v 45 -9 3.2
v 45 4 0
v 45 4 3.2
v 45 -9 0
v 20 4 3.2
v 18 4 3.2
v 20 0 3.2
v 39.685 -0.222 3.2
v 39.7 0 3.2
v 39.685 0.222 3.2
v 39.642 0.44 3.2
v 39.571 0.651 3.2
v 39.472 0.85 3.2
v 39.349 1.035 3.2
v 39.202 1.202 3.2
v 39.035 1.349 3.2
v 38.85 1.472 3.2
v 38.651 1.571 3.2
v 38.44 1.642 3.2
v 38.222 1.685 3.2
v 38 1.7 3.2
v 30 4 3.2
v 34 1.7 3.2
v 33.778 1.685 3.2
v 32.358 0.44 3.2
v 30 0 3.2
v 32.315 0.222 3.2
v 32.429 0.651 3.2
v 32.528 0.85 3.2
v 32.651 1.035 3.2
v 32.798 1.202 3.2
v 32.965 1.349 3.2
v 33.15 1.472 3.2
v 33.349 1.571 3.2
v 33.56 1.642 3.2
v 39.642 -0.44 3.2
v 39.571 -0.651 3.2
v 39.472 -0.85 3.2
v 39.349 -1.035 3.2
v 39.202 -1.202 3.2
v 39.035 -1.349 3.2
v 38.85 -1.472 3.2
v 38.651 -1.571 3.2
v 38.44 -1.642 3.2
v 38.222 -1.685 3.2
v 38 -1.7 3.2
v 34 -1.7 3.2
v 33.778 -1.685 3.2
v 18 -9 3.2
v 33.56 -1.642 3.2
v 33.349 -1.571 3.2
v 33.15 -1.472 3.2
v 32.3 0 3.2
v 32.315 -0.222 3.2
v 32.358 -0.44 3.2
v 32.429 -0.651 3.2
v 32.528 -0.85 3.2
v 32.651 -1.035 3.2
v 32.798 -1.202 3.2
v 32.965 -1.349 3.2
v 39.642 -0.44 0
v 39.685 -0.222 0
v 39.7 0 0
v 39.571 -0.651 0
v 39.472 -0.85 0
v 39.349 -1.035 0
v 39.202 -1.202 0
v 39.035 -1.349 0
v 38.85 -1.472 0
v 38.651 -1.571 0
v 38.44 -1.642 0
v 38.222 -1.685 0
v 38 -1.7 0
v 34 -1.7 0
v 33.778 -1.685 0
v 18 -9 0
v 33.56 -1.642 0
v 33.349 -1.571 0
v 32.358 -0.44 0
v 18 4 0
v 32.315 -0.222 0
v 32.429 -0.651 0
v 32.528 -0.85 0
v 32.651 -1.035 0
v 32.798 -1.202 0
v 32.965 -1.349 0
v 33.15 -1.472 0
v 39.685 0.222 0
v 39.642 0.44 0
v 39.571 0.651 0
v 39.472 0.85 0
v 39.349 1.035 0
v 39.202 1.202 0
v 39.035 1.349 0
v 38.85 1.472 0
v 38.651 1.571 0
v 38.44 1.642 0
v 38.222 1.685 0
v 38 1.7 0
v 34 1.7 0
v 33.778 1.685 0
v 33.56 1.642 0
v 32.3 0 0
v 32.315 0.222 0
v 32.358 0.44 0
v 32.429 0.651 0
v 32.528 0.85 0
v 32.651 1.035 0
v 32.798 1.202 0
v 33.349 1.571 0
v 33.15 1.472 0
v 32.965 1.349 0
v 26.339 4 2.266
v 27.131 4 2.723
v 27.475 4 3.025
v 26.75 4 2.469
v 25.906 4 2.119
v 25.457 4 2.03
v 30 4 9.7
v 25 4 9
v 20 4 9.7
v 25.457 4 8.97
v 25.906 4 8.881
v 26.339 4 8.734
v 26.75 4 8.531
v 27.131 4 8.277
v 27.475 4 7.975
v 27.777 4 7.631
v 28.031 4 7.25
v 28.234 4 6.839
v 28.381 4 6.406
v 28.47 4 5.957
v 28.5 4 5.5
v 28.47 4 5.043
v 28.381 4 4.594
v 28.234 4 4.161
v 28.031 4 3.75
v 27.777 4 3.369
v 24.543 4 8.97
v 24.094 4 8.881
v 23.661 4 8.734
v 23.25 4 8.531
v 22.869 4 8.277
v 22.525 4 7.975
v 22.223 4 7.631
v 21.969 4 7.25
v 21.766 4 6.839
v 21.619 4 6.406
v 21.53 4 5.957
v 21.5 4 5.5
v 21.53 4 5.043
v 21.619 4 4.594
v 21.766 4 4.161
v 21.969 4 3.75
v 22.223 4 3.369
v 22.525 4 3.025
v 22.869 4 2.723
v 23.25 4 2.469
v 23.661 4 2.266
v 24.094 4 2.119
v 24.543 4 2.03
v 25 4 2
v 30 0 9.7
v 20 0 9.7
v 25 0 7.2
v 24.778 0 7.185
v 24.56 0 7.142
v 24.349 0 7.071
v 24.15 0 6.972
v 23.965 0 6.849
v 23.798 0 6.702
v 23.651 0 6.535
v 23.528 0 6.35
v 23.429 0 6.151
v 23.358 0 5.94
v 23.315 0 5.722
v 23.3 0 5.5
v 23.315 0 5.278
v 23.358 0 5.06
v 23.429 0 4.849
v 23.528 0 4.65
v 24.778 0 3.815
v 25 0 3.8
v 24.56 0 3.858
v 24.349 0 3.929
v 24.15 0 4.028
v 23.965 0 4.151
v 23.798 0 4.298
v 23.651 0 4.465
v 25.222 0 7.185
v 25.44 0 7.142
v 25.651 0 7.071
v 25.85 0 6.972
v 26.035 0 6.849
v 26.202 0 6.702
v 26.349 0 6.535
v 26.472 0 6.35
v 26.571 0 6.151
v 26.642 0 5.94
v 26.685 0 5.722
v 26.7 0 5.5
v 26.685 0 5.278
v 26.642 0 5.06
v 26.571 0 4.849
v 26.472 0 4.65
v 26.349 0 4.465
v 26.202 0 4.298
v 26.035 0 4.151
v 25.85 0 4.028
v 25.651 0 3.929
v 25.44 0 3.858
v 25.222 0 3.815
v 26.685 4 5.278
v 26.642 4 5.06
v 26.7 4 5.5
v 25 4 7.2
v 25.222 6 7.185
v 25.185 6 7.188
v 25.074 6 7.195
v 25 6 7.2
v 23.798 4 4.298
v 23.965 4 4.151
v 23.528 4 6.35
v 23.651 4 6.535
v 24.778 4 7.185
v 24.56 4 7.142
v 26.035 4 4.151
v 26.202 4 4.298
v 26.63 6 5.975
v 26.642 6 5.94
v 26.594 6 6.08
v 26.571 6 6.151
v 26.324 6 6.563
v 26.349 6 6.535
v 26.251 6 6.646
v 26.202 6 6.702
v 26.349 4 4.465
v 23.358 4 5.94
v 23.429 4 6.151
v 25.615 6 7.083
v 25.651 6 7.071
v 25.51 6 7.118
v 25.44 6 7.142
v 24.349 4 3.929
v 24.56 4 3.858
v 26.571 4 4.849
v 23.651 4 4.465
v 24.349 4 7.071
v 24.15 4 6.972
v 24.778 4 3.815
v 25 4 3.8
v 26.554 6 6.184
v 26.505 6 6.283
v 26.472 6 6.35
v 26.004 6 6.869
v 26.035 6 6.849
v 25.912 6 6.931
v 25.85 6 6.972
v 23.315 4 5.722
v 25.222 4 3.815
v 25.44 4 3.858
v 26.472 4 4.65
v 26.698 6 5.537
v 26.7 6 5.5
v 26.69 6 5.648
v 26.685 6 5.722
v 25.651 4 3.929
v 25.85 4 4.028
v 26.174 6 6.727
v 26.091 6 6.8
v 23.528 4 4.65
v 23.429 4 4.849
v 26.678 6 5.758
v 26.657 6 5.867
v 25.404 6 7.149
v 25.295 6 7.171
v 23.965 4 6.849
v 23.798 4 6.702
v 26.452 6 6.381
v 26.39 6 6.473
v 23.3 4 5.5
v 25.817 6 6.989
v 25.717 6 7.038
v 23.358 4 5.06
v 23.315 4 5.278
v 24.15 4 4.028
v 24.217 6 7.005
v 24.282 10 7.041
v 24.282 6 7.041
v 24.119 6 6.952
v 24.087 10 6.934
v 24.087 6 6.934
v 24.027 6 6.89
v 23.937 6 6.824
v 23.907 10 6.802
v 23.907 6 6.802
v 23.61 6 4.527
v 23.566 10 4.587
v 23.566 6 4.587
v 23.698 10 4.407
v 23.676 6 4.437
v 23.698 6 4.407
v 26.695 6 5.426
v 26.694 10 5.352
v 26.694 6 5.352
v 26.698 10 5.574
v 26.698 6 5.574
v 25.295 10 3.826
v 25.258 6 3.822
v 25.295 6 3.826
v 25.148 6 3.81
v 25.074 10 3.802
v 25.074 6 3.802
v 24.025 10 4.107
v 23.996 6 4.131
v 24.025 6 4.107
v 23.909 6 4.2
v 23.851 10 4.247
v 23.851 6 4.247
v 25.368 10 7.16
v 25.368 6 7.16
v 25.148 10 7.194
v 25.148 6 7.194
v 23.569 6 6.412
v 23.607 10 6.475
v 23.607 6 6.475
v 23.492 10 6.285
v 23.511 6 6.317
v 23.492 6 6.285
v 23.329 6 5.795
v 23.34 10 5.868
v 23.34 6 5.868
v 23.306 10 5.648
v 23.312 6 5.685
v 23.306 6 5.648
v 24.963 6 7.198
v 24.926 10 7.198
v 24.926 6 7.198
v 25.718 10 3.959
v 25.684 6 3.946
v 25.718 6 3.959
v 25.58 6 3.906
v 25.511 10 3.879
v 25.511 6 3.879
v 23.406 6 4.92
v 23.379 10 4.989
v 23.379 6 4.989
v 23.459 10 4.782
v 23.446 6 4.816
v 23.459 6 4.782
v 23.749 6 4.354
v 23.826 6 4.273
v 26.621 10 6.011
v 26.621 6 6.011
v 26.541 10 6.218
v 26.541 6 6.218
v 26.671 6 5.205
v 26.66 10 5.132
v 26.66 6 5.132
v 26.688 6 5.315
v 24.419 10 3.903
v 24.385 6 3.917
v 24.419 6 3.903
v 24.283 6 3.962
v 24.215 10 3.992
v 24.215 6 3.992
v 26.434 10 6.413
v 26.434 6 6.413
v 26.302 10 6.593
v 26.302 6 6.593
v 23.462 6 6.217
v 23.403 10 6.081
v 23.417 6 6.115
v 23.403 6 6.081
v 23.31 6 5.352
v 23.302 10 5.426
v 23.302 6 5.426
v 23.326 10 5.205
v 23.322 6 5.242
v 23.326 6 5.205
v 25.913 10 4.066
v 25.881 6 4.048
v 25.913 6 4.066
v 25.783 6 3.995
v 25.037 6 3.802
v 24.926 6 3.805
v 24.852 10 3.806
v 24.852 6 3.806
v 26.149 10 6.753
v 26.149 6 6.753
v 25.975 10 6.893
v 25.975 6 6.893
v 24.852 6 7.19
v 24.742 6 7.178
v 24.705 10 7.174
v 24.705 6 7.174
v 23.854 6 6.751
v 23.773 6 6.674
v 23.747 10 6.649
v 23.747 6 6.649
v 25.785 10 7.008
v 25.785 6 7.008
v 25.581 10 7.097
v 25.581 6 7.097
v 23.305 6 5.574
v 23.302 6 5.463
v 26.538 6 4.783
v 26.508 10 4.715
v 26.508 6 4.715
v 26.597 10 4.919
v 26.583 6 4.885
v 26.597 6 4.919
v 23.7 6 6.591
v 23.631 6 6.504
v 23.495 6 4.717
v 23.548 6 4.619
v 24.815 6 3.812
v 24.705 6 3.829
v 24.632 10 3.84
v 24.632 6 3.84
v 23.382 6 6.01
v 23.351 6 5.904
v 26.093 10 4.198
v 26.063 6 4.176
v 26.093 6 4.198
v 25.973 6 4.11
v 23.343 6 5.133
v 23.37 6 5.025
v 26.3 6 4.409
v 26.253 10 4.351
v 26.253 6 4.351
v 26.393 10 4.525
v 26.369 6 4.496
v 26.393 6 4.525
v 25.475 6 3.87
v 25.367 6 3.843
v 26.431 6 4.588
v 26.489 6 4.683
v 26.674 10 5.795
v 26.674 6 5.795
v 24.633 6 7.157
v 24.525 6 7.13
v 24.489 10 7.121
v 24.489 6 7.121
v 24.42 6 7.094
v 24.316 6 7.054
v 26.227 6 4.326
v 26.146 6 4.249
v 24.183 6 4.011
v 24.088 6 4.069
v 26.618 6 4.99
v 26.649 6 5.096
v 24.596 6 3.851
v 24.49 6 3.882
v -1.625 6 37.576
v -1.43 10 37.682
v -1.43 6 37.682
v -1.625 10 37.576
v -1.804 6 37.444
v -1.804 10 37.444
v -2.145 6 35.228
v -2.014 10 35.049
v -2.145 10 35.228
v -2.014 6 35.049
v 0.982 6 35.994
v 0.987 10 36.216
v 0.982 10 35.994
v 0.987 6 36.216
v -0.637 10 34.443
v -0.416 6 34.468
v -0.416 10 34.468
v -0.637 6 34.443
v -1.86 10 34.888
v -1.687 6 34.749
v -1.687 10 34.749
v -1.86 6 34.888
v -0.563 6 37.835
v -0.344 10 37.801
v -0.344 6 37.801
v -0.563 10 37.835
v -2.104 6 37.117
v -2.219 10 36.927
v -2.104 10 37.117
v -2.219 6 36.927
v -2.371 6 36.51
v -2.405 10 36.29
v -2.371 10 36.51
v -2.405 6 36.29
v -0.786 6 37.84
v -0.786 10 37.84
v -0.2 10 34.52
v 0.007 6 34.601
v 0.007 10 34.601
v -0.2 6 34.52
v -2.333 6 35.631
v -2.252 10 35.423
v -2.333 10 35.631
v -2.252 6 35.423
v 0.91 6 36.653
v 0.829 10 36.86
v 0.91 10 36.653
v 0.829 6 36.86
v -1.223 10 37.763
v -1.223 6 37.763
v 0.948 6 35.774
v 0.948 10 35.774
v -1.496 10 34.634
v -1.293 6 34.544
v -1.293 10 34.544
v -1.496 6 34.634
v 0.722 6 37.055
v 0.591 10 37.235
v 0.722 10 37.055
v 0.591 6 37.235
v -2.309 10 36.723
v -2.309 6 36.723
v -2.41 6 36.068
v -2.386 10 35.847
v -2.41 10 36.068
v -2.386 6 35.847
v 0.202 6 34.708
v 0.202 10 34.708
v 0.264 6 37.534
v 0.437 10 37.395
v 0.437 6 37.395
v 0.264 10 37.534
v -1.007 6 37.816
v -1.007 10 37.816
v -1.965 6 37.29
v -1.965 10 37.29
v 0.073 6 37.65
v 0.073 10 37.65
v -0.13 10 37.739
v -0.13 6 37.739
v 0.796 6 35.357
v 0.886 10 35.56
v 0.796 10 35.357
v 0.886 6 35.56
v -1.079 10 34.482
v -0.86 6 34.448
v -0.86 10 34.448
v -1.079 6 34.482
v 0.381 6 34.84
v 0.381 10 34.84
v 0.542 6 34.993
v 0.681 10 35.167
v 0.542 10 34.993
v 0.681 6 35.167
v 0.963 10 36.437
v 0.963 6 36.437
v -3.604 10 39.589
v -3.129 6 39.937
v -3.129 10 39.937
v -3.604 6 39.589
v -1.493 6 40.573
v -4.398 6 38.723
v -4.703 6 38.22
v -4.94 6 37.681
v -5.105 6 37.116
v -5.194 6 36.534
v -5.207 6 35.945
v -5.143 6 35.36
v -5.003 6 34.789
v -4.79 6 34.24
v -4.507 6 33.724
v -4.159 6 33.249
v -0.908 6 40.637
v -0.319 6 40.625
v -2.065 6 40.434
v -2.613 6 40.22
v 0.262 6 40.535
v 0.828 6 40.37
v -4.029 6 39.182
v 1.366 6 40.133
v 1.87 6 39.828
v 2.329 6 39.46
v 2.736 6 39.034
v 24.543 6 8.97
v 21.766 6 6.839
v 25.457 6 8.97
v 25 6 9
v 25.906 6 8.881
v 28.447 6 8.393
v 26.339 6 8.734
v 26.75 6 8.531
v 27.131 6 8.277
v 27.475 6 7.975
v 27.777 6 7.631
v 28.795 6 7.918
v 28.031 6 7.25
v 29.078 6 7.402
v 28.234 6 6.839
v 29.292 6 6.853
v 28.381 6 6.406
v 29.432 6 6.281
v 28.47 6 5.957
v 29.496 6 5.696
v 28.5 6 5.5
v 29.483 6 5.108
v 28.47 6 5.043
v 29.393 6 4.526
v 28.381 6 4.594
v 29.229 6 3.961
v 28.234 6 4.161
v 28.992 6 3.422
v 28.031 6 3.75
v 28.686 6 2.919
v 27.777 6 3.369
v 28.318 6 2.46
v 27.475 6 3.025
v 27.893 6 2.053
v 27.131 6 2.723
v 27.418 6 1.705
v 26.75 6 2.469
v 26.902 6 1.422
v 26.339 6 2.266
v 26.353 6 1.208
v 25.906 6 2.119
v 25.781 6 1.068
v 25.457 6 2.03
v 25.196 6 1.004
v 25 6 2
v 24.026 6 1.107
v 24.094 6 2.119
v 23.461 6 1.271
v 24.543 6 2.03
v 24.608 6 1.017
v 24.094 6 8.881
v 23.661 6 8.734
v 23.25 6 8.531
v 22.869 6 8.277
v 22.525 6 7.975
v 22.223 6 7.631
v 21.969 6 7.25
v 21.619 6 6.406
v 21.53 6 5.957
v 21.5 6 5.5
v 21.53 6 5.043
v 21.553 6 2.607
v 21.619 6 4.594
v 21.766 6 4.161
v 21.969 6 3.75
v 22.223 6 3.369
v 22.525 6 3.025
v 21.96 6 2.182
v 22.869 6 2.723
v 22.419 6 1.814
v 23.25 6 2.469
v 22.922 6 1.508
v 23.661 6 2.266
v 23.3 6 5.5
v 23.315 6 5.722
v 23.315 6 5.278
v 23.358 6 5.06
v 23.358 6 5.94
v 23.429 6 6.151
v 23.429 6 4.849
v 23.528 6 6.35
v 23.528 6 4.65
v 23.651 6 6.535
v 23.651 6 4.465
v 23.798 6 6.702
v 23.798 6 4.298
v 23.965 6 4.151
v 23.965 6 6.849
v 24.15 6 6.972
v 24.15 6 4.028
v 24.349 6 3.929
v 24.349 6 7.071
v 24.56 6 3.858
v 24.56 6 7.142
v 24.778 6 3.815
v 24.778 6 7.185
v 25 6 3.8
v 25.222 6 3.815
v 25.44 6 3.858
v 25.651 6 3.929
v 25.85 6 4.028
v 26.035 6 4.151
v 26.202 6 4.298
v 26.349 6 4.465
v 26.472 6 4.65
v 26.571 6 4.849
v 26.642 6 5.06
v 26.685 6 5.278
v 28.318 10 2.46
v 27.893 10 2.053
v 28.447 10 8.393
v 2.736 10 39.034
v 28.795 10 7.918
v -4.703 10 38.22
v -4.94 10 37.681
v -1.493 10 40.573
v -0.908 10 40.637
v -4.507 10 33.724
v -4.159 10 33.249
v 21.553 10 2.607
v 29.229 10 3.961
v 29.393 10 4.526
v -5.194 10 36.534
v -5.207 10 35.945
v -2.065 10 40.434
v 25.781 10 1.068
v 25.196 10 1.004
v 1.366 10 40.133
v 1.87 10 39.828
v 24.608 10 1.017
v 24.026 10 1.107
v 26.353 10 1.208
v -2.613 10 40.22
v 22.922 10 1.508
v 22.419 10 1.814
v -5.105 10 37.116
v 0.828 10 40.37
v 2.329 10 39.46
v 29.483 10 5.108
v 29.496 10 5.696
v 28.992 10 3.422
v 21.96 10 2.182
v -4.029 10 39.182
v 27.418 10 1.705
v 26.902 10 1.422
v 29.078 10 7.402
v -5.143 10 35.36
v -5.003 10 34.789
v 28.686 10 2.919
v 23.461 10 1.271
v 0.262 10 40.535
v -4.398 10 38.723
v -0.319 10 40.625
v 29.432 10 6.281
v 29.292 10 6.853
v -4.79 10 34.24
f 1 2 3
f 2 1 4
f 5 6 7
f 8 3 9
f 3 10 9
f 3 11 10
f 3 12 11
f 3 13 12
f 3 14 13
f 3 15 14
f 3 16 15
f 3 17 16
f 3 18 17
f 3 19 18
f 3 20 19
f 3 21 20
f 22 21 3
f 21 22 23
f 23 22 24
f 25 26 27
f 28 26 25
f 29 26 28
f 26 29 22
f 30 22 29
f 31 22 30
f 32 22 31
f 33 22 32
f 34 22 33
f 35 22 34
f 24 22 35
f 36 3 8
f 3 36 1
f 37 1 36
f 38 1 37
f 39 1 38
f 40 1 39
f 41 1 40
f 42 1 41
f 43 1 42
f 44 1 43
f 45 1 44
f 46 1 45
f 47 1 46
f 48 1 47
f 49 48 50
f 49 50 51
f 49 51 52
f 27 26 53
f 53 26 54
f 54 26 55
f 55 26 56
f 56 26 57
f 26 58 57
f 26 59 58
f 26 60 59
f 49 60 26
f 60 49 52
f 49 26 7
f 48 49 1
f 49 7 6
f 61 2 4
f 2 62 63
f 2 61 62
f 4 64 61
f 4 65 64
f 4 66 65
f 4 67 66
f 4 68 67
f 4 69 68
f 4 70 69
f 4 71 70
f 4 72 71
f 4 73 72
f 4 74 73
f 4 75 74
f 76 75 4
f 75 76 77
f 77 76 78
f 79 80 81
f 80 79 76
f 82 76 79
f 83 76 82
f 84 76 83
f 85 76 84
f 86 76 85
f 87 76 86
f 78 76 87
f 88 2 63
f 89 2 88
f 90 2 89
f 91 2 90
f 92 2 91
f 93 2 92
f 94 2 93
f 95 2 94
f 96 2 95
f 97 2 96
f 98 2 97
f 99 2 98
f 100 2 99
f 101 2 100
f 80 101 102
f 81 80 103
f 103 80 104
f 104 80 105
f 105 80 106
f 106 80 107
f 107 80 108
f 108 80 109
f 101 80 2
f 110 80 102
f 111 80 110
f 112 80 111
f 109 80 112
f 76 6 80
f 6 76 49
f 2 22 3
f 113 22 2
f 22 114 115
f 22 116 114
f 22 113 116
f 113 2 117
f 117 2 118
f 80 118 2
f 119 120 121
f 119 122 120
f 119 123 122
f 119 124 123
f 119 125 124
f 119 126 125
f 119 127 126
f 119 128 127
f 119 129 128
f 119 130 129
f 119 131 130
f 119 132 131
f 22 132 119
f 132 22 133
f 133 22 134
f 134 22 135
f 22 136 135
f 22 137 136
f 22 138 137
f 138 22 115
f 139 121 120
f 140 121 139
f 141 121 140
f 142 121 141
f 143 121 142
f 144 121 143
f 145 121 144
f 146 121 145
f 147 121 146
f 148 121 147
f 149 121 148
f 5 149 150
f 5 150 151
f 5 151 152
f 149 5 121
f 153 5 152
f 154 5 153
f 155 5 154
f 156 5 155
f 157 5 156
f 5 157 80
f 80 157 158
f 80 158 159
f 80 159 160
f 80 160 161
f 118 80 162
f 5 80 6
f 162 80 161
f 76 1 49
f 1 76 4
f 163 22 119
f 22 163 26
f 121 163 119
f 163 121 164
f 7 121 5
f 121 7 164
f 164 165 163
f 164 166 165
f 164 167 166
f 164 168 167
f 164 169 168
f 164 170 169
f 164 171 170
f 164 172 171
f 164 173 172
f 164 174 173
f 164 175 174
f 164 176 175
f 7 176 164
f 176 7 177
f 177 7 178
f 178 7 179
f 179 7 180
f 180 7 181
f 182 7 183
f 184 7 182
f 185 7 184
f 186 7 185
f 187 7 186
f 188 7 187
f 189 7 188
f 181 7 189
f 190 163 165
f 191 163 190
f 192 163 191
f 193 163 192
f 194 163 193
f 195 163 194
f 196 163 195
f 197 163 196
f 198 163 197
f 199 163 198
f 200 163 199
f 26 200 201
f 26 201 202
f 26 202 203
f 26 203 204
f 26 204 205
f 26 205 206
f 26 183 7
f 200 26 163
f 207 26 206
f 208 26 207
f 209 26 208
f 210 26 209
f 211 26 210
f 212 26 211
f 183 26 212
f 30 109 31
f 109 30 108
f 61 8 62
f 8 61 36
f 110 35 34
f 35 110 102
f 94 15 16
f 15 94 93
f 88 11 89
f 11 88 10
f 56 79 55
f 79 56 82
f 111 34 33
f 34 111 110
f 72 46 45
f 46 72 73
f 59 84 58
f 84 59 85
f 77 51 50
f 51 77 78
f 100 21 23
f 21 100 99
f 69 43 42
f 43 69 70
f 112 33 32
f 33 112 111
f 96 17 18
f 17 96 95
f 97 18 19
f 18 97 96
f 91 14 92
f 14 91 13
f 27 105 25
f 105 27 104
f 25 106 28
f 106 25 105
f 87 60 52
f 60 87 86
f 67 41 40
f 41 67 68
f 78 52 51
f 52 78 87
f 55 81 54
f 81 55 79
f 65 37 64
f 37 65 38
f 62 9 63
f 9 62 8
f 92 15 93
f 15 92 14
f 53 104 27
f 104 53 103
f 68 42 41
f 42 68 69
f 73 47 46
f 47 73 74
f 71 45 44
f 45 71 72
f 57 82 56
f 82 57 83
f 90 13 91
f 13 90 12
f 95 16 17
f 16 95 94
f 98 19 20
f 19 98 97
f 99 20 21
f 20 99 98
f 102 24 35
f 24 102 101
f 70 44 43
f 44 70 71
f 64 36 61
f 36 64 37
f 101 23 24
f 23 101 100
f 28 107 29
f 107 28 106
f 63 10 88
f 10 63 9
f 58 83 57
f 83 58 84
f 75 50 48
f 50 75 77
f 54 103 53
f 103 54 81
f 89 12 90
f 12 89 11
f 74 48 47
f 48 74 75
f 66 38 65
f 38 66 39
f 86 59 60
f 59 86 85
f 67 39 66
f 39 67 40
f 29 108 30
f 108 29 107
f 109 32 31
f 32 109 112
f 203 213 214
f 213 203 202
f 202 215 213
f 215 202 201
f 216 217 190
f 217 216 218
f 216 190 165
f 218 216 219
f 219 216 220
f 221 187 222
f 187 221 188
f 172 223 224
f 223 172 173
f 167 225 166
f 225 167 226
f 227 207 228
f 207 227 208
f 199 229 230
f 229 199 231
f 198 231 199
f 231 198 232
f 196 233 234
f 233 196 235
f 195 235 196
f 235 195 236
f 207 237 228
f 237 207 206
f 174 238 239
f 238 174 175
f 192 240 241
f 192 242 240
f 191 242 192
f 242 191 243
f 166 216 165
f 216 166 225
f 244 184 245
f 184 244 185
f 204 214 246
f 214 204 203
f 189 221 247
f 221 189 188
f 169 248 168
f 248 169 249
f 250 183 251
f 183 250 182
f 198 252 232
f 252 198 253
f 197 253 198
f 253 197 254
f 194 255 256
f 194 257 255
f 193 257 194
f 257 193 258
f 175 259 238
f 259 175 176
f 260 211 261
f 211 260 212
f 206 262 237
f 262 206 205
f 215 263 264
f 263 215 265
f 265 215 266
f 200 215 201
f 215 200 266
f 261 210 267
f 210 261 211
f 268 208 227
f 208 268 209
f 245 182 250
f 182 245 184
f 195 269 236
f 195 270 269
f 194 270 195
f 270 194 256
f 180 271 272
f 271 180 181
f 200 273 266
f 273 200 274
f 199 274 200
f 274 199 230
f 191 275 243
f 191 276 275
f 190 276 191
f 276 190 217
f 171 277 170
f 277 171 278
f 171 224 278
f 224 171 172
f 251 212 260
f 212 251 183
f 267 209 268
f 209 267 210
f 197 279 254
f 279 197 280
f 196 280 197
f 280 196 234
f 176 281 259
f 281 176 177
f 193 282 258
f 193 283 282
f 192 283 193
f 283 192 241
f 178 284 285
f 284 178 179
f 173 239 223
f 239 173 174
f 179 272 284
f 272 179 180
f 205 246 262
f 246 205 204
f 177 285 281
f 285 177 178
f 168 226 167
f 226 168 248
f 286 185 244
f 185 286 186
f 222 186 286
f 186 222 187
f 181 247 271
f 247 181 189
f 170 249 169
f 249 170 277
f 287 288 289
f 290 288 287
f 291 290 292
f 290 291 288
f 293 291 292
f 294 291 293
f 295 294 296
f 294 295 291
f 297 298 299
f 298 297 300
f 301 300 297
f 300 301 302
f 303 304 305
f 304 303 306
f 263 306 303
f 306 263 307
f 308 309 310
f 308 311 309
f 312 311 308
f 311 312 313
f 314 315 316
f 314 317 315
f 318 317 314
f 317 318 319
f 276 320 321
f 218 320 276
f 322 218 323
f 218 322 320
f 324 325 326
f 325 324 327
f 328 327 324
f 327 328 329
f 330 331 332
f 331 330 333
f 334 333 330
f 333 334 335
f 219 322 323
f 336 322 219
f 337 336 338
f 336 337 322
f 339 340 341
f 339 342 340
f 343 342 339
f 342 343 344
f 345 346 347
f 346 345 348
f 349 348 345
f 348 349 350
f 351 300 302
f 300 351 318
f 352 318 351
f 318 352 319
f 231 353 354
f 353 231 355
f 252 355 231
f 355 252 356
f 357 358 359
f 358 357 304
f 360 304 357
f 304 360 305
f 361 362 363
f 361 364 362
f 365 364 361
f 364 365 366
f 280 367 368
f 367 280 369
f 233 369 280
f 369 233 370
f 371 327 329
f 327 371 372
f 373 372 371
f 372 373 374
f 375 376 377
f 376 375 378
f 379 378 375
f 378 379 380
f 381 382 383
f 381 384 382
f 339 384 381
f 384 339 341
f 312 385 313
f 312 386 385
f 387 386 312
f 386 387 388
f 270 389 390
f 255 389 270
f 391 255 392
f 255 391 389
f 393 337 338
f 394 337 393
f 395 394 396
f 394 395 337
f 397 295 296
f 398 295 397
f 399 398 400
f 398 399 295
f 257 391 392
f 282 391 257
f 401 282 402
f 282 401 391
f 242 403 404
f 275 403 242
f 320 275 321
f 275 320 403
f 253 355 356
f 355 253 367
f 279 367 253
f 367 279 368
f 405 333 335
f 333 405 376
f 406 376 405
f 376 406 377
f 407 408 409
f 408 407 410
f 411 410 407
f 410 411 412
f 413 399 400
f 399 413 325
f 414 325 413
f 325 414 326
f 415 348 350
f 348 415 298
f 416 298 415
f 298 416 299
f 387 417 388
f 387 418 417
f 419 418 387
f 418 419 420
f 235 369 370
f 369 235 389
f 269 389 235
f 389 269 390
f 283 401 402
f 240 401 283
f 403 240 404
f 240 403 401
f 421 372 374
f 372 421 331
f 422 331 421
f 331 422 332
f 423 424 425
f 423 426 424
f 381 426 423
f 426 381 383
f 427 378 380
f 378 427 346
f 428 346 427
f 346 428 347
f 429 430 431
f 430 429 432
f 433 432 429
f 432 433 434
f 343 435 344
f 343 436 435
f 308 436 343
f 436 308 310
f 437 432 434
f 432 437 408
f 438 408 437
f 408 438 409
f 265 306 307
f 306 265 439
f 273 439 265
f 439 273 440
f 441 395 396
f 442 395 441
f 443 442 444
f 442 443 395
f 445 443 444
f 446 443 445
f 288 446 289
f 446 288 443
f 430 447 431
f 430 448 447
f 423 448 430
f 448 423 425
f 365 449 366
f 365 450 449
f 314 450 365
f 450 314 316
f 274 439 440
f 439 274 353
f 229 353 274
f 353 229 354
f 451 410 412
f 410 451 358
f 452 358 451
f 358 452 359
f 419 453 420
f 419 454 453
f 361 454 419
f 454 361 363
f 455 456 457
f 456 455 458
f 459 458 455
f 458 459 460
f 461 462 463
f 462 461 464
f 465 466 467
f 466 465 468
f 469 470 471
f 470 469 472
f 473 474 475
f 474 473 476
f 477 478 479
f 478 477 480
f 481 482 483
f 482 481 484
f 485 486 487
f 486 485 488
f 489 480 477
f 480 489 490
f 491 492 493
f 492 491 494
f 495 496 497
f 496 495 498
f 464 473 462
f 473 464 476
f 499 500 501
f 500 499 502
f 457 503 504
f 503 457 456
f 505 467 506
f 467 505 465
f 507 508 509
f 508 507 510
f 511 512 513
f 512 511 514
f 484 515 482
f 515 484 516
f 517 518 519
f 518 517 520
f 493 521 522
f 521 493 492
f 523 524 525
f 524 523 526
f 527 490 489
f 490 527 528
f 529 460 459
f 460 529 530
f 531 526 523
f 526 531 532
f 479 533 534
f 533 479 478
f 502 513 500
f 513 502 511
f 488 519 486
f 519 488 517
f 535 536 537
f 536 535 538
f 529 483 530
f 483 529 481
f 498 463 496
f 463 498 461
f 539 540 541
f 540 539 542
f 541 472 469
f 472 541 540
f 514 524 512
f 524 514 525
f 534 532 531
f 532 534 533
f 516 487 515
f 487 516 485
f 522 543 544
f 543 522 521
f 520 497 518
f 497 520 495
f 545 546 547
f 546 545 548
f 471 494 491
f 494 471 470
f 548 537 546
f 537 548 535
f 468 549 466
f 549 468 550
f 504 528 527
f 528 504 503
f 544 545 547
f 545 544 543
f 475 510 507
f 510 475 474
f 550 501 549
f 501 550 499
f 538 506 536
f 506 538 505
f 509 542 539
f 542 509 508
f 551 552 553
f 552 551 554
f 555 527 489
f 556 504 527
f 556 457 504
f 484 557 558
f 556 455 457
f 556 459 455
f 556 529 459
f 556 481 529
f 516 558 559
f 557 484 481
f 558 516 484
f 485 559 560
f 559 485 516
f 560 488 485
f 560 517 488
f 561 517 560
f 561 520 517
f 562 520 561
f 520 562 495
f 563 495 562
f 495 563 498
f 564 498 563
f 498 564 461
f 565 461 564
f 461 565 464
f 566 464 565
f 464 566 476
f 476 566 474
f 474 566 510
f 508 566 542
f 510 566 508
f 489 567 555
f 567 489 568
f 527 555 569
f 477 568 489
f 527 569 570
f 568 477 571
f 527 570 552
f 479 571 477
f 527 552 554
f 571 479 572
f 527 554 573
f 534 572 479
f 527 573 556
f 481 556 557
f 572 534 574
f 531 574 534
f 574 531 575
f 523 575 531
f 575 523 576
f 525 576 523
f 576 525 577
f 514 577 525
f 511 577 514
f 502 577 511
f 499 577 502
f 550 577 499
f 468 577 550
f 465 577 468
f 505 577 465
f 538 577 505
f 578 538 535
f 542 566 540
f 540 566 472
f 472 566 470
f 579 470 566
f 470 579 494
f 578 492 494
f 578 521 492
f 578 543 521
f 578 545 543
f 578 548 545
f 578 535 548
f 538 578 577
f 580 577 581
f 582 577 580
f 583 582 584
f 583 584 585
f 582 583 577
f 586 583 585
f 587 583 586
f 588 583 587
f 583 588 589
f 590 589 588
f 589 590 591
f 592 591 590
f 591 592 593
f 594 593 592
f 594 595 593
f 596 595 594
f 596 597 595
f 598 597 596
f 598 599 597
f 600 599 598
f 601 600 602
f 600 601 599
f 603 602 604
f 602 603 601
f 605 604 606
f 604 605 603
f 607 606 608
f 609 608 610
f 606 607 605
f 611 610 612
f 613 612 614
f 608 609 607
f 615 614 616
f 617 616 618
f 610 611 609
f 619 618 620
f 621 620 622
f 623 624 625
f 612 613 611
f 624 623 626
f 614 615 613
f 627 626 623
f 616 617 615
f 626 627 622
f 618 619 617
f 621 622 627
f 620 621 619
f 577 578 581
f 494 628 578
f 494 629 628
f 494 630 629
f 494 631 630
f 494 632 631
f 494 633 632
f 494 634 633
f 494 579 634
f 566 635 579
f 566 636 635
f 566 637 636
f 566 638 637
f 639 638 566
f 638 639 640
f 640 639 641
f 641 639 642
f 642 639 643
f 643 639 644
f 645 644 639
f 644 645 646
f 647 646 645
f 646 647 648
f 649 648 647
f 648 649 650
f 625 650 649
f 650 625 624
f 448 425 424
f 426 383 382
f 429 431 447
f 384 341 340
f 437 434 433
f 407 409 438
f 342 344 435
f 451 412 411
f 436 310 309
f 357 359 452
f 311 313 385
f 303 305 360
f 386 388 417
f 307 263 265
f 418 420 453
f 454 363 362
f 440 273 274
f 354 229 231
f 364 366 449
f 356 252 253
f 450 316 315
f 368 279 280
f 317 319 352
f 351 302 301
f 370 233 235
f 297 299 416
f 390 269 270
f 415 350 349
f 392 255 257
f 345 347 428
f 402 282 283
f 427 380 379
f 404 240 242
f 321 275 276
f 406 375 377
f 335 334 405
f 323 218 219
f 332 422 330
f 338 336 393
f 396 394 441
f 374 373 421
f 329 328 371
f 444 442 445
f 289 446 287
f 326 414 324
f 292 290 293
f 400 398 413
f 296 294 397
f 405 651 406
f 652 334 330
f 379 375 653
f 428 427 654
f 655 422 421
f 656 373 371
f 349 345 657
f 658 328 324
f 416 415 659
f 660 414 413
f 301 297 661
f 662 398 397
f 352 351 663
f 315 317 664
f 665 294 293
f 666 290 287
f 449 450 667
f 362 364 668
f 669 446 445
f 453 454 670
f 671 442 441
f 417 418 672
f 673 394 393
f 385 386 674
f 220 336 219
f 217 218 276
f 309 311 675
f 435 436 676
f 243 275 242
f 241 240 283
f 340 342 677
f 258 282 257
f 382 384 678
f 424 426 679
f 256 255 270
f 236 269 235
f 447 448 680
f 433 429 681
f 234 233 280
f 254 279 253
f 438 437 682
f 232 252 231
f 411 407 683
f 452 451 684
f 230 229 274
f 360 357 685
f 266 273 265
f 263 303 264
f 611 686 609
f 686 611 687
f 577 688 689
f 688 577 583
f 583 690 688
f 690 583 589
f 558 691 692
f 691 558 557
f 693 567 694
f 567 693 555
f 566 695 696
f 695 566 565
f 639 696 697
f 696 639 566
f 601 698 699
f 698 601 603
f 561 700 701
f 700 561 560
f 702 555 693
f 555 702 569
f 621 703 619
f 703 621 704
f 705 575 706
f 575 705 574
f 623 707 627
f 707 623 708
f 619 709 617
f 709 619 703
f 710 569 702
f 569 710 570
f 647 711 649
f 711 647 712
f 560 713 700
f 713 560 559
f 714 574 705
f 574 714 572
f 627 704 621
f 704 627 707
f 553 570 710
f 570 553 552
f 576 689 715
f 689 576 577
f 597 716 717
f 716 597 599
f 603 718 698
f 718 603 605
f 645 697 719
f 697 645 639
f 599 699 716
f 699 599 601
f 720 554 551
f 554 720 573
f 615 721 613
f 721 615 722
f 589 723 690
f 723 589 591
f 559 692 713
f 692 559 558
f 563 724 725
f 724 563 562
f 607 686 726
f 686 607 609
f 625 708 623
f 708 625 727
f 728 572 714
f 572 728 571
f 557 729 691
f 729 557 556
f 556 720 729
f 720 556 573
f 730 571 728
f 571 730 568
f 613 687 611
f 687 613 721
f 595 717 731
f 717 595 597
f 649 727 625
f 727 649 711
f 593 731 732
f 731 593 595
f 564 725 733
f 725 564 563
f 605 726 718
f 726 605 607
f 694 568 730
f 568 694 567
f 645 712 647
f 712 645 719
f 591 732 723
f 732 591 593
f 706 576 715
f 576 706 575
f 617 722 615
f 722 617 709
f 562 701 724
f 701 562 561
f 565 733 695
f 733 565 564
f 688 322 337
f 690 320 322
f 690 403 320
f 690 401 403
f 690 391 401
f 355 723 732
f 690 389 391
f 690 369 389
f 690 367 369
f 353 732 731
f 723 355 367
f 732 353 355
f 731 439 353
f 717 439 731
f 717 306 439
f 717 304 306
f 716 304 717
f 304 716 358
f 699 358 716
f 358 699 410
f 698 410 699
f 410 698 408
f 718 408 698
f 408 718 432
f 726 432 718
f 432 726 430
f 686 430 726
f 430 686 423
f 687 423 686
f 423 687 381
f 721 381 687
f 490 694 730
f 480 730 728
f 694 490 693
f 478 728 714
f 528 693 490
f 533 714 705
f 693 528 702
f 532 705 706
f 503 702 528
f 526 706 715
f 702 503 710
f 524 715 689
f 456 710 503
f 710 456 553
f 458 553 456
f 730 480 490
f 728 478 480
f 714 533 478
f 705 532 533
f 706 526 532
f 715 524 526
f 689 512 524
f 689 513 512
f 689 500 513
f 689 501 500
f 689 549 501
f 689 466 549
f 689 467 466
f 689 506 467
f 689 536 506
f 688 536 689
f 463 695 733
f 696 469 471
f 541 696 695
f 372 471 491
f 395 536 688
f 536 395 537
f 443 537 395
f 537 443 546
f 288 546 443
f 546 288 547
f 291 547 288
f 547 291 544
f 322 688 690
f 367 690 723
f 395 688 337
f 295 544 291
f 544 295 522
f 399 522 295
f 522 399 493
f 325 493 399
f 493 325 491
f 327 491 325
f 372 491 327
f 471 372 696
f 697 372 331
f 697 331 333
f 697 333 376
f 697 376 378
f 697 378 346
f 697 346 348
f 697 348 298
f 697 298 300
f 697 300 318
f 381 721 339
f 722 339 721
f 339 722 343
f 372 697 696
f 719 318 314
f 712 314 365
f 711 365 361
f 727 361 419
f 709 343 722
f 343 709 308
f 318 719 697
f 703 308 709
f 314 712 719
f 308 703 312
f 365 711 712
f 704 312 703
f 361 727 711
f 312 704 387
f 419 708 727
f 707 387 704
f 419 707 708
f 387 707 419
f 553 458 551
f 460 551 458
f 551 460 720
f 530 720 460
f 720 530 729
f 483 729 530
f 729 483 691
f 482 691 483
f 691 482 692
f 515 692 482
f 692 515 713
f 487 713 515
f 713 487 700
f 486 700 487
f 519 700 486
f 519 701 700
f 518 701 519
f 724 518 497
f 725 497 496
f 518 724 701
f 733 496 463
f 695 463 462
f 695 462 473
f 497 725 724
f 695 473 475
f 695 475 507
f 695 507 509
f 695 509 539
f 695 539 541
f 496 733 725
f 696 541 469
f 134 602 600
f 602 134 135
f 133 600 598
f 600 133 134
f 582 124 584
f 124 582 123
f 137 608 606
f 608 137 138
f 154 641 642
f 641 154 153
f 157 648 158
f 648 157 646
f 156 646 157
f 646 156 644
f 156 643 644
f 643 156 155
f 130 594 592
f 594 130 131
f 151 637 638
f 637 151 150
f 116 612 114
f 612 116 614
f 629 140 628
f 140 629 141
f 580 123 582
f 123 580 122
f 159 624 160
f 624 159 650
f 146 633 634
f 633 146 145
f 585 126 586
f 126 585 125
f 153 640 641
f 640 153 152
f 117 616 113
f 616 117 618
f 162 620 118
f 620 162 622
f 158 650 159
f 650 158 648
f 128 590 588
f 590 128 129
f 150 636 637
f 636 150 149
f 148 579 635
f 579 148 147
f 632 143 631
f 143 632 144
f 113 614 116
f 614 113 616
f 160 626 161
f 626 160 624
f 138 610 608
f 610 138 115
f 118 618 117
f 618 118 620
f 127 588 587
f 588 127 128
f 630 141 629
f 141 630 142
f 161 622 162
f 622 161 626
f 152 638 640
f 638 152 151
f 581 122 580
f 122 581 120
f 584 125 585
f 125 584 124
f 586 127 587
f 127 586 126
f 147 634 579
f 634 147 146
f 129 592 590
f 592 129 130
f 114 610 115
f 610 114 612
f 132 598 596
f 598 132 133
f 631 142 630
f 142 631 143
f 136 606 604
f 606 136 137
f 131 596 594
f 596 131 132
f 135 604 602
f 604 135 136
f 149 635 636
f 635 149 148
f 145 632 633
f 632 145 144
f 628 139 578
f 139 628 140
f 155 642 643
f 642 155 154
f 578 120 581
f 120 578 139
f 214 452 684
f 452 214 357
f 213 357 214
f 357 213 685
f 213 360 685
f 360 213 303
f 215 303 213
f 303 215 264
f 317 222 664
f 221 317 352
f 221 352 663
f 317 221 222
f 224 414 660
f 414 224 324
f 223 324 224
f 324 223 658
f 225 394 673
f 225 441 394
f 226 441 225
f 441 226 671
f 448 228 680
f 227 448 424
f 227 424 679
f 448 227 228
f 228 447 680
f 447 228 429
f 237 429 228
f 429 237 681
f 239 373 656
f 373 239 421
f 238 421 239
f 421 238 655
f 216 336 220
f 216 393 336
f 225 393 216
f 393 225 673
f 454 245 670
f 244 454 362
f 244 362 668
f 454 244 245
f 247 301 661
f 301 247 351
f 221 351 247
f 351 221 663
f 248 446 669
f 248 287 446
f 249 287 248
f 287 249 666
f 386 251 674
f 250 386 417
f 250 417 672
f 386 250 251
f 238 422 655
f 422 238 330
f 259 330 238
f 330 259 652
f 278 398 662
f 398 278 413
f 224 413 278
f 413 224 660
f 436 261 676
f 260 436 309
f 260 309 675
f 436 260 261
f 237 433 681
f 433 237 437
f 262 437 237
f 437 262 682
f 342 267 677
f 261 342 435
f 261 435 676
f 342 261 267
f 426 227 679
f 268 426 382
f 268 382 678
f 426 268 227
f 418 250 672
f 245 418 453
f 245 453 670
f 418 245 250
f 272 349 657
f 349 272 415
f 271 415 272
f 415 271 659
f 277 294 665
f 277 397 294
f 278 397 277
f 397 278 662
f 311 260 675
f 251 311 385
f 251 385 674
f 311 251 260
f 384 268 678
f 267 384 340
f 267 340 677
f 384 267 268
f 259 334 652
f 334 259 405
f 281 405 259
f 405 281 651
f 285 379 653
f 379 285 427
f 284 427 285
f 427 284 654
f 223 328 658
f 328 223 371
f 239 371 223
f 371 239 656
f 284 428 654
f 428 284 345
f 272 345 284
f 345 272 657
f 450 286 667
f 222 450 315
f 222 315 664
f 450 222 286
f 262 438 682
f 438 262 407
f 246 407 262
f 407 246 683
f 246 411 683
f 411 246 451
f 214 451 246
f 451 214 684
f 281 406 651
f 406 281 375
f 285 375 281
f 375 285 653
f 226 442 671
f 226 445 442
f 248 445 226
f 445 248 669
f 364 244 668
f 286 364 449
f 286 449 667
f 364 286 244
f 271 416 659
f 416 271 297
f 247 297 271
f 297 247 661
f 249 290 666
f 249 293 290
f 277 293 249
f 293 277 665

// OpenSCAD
// file: spacers.scad
// Print one M3 spacer per needed joint; tune height after real stackup.
include <parameters.scad>
$fn = 48;
assert(stage2_spacer_outer_d > stage2_pivot_hole_d + 2);

module spacer() {
    difference() {
        cylinder(d = stage2_spacer_outer_d, h = stage2_spacer_height);
        translate([0,0,-0.1])
            cylinder(d = stage2_pivot_hole_d, h = stage2_spacer_height + 0.2);
    }
}

spacer();
// file: pushrod_lid.scad
// PROVISIONAL upper rigid rod, bell crank to moving lid.
include <parameters.scad>
$fn = 48;
assert(bell_upper_rod_length > stage2_rod_width + 10);
assert(stage2_rod_width > stage2_pivot_hole_d + 4);

module pushrod_lid() {
    difference() {
        linear_extrude(height = stage2_rod_thickness)
            hull() {
                circle(d = stage2_rod_width);
                translate([bell_upper_rod_length, 0]) circle(d = stage2_rod_width);
            }
        for (x = [0, bell_upper_rod_length])
            translate([x, 0, -0.1])
                cylinder(d = stage2_pivot_hole_d,
                         h = stage2_rod_thickness + 0.2);
    }
}

pushrod_lid();
// file: lid_attachment.scad
// RETIRED FOR LID MOUNTING: user reports about 0.4 mm play on the lid.
// One slotted fixing has no positive anti-rotation feature. Preserve this
// version for the 40 mm rod joint bench-fit only.
// A two-point, no-drill lid fixing requires measured hole spacing and a
// confirmed way to retain both holes. Do not power the linkage with this pad.
// Do not drill the original lid from these unmeasured coordinates.
include <parameters.scad>
$fn = 48;

bell_lid_pad_length = 27.0; // PROPOSED, along lid depth
bell_lid_pad_width = 18.0; // PROPOSED, across lid
bell_lid_pad_thickness = 3.2;
bell_lid_pad_x0 = bell_lid_pivot_x - 7.0;
bell_lid_tab_width_x = 10.0;
bell_lid_tab_thickness_y = 4.0;
bell_lid_pin_height_above_pad = bell_lid_pivot_z - lid_thickness;
bell_lid_tab_crown = 2.5; // PROPOSED material above pivot hole
bell_lid_tab_height = bell_lid_pin_height_above_pad
                      + stage2_pivot_hole_d / 2 + bell_lid_tab_crown;
bell_lid_existing_hole_x = 36.0; // UNMEASURED, from hinge datum
bell_lid_existing_hole_slot = 4.0; // ±2 mm provisional adjustment

assert(bell_lid_existing_hole_x > bell_lid_pad_x0 + 8);
assert(bell_lid_existing_hole_x < bell_lid_pad_x0 + bell_lid_pad_length - 3);
assert(bell_lid_pin_height_above_pad > bell_lid_pad_thickness
       + stage2_pivot_hole_d / 2 - 1);
assert(bell_upper_rod_plane_y - bell_rod_thickness / 2
       > bell_lid_tab_thickness_y);

module lid_attachment() {
    difference() {
        union() {
            // End the base at the tab's outer face. The upper rod runs on
            // the +Y side; the previous full-width base hit its pivot end.
            translate([bell_lid_pad_x0, -bell_lid_pad_width / 2, 0])
                cube([bell_lid_pad_length,
                      bell_lid_pad_width / 2 + bell_lid_tab_thickness_y,
                      bell_lid_pad_thickness]);
            translate([bell_lid_pivot_x - bell_lid_tab_width_x / 2,
                       0, bell_lid_pad_thickness])
                cube([bell_lid_tab_width_x, bell_lid_tab_thickness_y,
                      bell_lid_tab_height - bell_lid_pad_thickness]);
        }
        // Slot is for a confirmed existing hole, with a backing washer.
        hull()
            for (dx = [-bell_lid_existing_hole_slot / 2,
                        bell_lid_existing_hole_slot / 2])
                translate([bell_lid_existing_hole_x + dx, 0, -0.1])
                    cylinder(d = stage2_pivot_hole_d,
                             h = bell_lid_pad_thickness + 0.2);
        translate([bell_lid_pivot_x, -0.1, bell_lid_pin_height_above_pad])
            rotate([-90,0,0])
                cylinder(d = stage2_pivot_hole_d,
                         h = bell_lid_tab_thickness_y + 0.2);
    }
}

lid_attachment();
// main file
// Unpowered local fit view: revised pad + one existing 2 mm spacer + 40 mm rod.
// Rod angle is illustrative; lid attachment hole location is still unmeasured.
include <parameters.scad>
use <lid_attachment.scad>
use <pushrod_lid.scad>
use <spacers.scad>
$fn = 64;

rod_angle = 130;
rod_c = cos(rod_angle);
rod_s = sin(rod_angle);
rod_pivot_x = bell_lid_pivot_x;
rod_pivot_z = bell_lid_pivot_z - lid_thickness;

color([0.25, 0.45, 0.82]) lid_attachment();

// Rotate the flat-printed rod into the linkage X/Z plane. Its printed
// thickness, 4 mm, runs along Y; spacer and tab form a 10 mm pin stack.
color([0.96, 0.55, 0.12])
    multmatrix([
        [rod_c, rod_s, 0, rod_pivot_x],
        [0, 0, 1, 6],
        [rod_s, -rod_c, 0, rod_pivot_z],
        [0, 0, 0, 1]
    ]) pushrod_lid();

color([0.72, 0.73, 0.76])
    translate([rod_pivot_x, 4, rod_pivot_z])
        rotate([-90, 0, 0]) spacer();
